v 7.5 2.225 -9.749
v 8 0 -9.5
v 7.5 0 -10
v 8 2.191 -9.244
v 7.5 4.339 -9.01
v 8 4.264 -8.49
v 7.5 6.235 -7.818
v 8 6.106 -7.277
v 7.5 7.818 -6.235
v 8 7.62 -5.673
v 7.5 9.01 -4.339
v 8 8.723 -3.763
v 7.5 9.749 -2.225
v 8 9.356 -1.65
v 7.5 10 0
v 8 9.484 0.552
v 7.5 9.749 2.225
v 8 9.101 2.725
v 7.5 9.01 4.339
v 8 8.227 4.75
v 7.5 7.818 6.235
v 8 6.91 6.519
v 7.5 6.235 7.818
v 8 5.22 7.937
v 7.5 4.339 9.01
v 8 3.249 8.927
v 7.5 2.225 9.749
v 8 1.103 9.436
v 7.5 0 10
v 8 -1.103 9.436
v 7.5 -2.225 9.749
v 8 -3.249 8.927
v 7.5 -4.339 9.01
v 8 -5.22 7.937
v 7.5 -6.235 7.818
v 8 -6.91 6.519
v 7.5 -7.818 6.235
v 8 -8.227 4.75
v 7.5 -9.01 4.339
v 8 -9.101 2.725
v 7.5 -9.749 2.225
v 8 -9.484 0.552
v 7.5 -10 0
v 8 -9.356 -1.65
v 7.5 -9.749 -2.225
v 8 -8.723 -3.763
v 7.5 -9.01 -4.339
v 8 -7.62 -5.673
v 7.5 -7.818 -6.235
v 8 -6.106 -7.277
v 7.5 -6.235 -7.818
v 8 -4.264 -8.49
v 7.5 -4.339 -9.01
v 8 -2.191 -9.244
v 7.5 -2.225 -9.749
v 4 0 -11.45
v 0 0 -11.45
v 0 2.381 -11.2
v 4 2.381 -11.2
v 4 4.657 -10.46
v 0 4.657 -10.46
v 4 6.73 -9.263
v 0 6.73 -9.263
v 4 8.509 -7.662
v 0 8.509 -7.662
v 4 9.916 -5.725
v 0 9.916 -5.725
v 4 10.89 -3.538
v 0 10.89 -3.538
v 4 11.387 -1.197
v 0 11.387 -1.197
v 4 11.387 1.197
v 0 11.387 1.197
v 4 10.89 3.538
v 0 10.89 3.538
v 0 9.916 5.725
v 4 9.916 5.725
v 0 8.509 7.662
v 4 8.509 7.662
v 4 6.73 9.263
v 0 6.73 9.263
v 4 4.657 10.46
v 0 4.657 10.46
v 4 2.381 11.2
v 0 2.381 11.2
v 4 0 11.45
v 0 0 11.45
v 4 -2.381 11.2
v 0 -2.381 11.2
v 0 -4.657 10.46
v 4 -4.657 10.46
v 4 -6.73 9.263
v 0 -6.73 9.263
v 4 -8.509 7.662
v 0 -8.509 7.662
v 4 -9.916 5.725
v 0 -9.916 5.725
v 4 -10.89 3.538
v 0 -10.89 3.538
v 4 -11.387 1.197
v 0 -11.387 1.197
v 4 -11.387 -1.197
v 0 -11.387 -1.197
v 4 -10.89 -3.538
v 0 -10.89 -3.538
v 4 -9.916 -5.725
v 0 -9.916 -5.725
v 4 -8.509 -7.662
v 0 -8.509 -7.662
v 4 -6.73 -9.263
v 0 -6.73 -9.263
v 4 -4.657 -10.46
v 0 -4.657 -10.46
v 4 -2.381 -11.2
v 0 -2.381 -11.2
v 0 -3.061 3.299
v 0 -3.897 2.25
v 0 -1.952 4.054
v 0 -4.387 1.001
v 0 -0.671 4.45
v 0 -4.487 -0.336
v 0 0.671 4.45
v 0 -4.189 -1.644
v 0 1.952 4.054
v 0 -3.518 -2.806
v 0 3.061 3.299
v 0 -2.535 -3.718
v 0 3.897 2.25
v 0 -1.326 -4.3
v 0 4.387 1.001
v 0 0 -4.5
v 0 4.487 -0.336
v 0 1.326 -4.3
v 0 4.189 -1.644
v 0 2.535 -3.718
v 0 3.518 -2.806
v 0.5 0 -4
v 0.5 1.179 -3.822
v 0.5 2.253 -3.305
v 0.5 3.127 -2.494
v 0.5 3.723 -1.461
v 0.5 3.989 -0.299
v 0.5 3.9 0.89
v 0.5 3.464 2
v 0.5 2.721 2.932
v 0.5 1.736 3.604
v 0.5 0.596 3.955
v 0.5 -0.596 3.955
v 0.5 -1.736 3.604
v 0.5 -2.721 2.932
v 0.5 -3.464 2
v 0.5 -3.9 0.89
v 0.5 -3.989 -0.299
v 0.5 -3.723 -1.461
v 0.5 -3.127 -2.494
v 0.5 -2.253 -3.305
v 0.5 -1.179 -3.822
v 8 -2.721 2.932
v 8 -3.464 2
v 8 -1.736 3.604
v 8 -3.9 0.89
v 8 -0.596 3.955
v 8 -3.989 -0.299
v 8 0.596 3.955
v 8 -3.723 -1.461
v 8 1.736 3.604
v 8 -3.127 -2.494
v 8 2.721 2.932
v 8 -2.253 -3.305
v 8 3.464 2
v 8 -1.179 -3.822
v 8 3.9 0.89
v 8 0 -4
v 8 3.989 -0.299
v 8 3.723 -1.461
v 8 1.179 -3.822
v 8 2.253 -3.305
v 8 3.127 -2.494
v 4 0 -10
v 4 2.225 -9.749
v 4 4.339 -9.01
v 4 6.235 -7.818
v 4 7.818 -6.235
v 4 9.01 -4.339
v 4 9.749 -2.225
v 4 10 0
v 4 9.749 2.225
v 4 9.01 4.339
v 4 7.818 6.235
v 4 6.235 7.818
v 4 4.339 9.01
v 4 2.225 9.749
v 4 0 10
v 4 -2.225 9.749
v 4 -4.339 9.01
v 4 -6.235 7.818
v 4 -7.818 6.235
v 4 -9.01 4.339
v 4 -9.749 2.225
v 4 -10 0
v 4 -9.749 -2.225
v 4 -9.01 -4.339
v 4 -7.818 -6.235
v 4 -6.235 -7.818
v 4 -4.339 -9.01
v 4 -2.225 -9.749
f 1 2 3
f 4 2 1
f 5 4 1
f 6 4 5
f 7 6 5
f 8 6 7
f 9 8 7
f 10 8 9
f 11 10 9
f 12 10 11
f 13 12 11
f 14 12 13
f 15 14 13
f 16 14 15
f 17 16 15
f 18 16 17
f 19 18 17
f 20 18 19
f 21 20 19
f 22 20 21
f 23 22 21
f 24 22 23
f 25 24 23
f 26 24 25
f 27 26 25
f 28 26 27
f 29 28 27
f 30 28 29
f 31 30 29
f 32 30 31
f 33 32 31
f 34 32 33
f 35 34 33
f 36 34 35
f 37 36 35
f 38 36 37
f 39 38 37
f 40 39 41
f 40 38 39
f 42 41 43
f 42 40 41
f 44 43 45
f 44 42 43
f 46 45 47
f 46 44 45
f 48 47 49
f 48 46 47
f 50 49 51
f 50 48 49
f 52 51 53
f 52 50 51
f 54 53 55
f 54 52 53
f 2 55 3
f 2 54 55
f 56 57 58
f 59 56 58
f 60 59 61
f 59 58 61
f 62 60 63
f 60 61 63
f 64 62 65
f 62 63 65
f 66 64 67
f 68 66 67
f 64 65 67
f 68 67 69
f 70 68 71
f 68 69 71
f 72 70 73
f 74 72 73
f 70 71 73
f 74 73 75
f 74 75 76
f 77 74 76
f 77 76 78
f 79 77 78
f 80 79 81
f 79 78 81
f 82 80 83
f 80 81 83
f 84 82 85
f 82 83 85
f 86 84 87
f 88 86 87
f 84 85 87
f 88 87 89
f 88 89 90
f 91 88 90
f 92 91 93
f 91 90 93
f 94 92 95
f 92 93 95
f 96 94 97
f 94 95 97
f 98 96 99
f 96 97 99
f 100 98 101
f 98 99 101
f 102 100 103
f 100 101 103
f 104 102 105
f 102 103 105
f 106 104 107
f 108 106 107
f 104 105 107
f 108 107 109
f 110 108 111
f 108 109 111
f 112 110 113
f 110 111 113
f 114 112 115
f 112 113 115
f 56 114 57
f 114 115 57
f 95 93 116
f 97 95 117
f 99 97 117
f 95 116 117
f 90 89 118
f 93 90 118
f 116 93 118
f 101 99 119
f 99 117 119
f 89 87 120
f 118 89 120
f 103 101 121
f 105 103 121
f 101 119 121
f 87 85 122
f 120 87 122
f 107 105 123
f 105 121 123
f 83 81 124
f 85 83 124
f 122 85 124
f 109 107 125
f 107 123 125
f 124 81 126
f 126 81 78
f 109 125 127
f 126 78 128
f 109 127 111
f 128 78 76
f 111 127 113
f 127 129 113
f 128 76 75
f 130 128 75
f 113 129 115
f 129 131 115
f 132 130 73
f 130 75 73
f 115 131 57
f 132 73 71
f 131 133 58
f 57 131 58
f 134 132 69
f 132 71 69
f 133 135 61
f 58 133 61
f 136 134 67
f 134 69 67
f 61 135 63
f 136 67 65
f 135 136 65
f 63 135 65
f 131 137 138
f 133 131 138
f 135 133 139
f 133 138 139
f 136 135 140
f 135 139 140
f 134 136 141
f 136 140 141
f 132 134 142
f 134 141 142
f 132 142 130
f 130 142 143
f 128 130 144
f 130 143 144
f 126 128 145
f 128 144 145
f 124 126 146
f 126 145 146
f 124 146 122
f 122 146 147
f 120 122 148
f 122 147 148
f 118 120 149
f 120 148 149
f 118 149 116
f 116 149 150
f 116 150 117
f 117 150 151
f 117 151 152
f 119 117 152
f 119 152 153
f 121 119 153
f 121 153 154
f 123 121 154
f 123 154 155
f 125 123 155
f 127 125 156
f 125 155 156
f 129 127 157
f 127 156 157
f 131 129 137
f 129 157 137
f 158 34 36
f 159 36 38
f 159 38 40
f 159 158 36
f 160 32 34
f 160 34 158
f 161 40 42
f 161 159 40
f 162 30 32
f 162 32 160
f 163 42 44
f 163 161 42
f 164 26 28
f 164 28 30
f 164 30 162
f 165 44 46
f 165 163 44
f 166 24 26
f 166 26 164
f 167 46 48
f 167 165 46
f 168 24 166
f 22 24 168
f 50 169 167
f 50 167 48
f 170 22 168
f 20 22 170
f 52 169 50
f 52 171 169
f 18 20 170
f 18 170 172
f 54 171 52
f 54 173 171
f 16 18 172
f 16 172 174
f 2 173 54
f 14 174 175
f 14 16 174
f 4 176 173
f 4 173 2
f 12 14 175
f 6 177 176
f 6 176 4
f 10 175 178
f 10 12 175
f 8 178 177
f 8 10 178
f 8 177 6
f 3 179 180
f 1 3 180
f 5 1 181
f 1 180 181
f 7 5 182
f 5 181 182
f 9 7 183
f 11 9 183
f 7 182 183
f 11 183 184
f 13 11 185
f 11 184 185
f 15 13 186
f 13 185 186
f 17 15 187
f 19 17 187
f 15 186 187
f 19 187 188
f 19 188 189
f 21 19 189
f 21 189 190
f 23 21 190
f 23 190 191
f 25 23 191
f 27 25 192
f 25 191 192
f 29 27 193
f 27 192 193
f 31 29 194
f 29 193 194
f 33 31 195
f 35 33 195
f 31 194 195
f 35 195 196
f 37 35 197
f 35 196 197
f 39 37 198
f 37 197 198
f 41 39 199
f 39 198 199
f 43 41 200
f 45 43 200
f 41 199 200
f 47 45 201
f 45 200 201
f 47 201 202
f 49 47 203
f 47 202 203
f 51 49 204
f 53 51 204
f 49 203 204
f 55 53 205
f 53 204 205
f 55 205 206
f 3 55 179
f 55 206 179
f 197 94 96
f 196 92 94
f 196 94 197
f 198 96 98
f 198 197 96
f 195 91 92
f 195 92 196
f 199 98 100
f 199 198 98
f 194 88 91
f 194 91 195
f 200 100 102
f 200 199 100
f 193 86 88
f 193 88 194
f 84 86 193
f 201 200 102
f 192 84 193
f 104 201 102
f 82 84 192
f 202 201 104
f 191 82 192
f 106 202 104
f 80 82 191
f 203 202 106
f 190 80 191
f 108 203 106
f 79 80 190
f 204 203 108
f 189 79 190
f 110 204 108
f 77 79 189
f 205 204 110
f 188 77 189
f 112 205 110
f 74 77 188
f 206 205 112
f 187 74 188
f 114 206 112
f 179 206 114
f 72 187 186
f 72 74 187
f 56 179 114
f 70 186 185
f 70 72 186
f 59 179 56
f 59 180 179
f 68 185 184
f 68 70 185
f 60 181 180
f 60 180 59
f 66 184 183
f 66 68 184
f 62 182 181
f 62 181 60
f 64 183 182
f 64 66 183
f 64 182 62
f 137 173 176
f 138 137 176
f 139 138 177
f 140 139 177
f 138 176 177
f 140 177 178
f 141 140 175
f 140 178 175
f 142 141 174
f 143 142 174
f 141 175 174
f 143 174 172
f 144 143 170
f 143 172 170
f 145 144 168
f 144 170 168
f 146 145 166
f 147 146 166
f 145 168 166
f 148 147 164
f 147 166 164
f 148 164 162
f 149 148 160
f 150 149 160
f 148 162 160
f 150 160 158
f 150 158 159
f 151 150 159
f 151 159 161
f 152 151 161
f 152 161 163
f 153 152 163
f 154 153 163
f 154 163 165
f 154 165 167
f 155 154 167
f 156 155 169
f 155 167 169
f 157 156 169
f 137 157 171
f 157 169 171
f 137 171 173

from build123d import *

# Parameters (mm, degrees)
SKETCH1_R           = 11.45
BOSS_EXTRUDE1_DEPTH = 4
SKETCH2_R           = 10
BOSS_EXTRUDE2_DEPTH = 4
SKETCH3_R           = 4
CUT_EXTRUDE1_DEPTH  = 8
CHAMFER1_SIZE       = 0.5


with BuildPart() as part:
    # Sketch1 → Boss-Extrude1 (new body)
    with BuildSketch(Plane(origin=(0, 0, 0), x_dir=(0, 0, -1), z_dir=(1, 0, 0))):
        Circle(SKETCH1_R)
    extrude(amount=BOSS_EXTRUDE1_DEPTH)

    # Sketch2 → Boss-Extrude2 (add)
    with BuildSketch(Plane(origin=(4, 0, 0), x_dir=(0, 0, -1), z_dir=(1, 0, 0))):
        Circle(SKETCH2_R)
    extrude(amount=BOSS_EXTRUDE2_DEPTH)

    # Sketch3 → Cut-Extrude1 (cut)
    with BuildSketch(Plane(origin=(8, 0, 0), x_dir=(0, 0, -1), z_dir=(1, 0, 0))):
        Circle(SKETCH3_R)
    extrude(amount=-CUT_EXTRUDE1_DEPTH, mode=Mode.SUBTRACT)

    # Chamfer1
    chamfer1_edges = [part.edges().sort_by_distance(p)[0] for p in [
        (0, 0, 4),
        (8, 0, 10),
    ]]
    chamfer(chamfer1_edges, length=CHAMFER1_SIZE)


solid = part.part
